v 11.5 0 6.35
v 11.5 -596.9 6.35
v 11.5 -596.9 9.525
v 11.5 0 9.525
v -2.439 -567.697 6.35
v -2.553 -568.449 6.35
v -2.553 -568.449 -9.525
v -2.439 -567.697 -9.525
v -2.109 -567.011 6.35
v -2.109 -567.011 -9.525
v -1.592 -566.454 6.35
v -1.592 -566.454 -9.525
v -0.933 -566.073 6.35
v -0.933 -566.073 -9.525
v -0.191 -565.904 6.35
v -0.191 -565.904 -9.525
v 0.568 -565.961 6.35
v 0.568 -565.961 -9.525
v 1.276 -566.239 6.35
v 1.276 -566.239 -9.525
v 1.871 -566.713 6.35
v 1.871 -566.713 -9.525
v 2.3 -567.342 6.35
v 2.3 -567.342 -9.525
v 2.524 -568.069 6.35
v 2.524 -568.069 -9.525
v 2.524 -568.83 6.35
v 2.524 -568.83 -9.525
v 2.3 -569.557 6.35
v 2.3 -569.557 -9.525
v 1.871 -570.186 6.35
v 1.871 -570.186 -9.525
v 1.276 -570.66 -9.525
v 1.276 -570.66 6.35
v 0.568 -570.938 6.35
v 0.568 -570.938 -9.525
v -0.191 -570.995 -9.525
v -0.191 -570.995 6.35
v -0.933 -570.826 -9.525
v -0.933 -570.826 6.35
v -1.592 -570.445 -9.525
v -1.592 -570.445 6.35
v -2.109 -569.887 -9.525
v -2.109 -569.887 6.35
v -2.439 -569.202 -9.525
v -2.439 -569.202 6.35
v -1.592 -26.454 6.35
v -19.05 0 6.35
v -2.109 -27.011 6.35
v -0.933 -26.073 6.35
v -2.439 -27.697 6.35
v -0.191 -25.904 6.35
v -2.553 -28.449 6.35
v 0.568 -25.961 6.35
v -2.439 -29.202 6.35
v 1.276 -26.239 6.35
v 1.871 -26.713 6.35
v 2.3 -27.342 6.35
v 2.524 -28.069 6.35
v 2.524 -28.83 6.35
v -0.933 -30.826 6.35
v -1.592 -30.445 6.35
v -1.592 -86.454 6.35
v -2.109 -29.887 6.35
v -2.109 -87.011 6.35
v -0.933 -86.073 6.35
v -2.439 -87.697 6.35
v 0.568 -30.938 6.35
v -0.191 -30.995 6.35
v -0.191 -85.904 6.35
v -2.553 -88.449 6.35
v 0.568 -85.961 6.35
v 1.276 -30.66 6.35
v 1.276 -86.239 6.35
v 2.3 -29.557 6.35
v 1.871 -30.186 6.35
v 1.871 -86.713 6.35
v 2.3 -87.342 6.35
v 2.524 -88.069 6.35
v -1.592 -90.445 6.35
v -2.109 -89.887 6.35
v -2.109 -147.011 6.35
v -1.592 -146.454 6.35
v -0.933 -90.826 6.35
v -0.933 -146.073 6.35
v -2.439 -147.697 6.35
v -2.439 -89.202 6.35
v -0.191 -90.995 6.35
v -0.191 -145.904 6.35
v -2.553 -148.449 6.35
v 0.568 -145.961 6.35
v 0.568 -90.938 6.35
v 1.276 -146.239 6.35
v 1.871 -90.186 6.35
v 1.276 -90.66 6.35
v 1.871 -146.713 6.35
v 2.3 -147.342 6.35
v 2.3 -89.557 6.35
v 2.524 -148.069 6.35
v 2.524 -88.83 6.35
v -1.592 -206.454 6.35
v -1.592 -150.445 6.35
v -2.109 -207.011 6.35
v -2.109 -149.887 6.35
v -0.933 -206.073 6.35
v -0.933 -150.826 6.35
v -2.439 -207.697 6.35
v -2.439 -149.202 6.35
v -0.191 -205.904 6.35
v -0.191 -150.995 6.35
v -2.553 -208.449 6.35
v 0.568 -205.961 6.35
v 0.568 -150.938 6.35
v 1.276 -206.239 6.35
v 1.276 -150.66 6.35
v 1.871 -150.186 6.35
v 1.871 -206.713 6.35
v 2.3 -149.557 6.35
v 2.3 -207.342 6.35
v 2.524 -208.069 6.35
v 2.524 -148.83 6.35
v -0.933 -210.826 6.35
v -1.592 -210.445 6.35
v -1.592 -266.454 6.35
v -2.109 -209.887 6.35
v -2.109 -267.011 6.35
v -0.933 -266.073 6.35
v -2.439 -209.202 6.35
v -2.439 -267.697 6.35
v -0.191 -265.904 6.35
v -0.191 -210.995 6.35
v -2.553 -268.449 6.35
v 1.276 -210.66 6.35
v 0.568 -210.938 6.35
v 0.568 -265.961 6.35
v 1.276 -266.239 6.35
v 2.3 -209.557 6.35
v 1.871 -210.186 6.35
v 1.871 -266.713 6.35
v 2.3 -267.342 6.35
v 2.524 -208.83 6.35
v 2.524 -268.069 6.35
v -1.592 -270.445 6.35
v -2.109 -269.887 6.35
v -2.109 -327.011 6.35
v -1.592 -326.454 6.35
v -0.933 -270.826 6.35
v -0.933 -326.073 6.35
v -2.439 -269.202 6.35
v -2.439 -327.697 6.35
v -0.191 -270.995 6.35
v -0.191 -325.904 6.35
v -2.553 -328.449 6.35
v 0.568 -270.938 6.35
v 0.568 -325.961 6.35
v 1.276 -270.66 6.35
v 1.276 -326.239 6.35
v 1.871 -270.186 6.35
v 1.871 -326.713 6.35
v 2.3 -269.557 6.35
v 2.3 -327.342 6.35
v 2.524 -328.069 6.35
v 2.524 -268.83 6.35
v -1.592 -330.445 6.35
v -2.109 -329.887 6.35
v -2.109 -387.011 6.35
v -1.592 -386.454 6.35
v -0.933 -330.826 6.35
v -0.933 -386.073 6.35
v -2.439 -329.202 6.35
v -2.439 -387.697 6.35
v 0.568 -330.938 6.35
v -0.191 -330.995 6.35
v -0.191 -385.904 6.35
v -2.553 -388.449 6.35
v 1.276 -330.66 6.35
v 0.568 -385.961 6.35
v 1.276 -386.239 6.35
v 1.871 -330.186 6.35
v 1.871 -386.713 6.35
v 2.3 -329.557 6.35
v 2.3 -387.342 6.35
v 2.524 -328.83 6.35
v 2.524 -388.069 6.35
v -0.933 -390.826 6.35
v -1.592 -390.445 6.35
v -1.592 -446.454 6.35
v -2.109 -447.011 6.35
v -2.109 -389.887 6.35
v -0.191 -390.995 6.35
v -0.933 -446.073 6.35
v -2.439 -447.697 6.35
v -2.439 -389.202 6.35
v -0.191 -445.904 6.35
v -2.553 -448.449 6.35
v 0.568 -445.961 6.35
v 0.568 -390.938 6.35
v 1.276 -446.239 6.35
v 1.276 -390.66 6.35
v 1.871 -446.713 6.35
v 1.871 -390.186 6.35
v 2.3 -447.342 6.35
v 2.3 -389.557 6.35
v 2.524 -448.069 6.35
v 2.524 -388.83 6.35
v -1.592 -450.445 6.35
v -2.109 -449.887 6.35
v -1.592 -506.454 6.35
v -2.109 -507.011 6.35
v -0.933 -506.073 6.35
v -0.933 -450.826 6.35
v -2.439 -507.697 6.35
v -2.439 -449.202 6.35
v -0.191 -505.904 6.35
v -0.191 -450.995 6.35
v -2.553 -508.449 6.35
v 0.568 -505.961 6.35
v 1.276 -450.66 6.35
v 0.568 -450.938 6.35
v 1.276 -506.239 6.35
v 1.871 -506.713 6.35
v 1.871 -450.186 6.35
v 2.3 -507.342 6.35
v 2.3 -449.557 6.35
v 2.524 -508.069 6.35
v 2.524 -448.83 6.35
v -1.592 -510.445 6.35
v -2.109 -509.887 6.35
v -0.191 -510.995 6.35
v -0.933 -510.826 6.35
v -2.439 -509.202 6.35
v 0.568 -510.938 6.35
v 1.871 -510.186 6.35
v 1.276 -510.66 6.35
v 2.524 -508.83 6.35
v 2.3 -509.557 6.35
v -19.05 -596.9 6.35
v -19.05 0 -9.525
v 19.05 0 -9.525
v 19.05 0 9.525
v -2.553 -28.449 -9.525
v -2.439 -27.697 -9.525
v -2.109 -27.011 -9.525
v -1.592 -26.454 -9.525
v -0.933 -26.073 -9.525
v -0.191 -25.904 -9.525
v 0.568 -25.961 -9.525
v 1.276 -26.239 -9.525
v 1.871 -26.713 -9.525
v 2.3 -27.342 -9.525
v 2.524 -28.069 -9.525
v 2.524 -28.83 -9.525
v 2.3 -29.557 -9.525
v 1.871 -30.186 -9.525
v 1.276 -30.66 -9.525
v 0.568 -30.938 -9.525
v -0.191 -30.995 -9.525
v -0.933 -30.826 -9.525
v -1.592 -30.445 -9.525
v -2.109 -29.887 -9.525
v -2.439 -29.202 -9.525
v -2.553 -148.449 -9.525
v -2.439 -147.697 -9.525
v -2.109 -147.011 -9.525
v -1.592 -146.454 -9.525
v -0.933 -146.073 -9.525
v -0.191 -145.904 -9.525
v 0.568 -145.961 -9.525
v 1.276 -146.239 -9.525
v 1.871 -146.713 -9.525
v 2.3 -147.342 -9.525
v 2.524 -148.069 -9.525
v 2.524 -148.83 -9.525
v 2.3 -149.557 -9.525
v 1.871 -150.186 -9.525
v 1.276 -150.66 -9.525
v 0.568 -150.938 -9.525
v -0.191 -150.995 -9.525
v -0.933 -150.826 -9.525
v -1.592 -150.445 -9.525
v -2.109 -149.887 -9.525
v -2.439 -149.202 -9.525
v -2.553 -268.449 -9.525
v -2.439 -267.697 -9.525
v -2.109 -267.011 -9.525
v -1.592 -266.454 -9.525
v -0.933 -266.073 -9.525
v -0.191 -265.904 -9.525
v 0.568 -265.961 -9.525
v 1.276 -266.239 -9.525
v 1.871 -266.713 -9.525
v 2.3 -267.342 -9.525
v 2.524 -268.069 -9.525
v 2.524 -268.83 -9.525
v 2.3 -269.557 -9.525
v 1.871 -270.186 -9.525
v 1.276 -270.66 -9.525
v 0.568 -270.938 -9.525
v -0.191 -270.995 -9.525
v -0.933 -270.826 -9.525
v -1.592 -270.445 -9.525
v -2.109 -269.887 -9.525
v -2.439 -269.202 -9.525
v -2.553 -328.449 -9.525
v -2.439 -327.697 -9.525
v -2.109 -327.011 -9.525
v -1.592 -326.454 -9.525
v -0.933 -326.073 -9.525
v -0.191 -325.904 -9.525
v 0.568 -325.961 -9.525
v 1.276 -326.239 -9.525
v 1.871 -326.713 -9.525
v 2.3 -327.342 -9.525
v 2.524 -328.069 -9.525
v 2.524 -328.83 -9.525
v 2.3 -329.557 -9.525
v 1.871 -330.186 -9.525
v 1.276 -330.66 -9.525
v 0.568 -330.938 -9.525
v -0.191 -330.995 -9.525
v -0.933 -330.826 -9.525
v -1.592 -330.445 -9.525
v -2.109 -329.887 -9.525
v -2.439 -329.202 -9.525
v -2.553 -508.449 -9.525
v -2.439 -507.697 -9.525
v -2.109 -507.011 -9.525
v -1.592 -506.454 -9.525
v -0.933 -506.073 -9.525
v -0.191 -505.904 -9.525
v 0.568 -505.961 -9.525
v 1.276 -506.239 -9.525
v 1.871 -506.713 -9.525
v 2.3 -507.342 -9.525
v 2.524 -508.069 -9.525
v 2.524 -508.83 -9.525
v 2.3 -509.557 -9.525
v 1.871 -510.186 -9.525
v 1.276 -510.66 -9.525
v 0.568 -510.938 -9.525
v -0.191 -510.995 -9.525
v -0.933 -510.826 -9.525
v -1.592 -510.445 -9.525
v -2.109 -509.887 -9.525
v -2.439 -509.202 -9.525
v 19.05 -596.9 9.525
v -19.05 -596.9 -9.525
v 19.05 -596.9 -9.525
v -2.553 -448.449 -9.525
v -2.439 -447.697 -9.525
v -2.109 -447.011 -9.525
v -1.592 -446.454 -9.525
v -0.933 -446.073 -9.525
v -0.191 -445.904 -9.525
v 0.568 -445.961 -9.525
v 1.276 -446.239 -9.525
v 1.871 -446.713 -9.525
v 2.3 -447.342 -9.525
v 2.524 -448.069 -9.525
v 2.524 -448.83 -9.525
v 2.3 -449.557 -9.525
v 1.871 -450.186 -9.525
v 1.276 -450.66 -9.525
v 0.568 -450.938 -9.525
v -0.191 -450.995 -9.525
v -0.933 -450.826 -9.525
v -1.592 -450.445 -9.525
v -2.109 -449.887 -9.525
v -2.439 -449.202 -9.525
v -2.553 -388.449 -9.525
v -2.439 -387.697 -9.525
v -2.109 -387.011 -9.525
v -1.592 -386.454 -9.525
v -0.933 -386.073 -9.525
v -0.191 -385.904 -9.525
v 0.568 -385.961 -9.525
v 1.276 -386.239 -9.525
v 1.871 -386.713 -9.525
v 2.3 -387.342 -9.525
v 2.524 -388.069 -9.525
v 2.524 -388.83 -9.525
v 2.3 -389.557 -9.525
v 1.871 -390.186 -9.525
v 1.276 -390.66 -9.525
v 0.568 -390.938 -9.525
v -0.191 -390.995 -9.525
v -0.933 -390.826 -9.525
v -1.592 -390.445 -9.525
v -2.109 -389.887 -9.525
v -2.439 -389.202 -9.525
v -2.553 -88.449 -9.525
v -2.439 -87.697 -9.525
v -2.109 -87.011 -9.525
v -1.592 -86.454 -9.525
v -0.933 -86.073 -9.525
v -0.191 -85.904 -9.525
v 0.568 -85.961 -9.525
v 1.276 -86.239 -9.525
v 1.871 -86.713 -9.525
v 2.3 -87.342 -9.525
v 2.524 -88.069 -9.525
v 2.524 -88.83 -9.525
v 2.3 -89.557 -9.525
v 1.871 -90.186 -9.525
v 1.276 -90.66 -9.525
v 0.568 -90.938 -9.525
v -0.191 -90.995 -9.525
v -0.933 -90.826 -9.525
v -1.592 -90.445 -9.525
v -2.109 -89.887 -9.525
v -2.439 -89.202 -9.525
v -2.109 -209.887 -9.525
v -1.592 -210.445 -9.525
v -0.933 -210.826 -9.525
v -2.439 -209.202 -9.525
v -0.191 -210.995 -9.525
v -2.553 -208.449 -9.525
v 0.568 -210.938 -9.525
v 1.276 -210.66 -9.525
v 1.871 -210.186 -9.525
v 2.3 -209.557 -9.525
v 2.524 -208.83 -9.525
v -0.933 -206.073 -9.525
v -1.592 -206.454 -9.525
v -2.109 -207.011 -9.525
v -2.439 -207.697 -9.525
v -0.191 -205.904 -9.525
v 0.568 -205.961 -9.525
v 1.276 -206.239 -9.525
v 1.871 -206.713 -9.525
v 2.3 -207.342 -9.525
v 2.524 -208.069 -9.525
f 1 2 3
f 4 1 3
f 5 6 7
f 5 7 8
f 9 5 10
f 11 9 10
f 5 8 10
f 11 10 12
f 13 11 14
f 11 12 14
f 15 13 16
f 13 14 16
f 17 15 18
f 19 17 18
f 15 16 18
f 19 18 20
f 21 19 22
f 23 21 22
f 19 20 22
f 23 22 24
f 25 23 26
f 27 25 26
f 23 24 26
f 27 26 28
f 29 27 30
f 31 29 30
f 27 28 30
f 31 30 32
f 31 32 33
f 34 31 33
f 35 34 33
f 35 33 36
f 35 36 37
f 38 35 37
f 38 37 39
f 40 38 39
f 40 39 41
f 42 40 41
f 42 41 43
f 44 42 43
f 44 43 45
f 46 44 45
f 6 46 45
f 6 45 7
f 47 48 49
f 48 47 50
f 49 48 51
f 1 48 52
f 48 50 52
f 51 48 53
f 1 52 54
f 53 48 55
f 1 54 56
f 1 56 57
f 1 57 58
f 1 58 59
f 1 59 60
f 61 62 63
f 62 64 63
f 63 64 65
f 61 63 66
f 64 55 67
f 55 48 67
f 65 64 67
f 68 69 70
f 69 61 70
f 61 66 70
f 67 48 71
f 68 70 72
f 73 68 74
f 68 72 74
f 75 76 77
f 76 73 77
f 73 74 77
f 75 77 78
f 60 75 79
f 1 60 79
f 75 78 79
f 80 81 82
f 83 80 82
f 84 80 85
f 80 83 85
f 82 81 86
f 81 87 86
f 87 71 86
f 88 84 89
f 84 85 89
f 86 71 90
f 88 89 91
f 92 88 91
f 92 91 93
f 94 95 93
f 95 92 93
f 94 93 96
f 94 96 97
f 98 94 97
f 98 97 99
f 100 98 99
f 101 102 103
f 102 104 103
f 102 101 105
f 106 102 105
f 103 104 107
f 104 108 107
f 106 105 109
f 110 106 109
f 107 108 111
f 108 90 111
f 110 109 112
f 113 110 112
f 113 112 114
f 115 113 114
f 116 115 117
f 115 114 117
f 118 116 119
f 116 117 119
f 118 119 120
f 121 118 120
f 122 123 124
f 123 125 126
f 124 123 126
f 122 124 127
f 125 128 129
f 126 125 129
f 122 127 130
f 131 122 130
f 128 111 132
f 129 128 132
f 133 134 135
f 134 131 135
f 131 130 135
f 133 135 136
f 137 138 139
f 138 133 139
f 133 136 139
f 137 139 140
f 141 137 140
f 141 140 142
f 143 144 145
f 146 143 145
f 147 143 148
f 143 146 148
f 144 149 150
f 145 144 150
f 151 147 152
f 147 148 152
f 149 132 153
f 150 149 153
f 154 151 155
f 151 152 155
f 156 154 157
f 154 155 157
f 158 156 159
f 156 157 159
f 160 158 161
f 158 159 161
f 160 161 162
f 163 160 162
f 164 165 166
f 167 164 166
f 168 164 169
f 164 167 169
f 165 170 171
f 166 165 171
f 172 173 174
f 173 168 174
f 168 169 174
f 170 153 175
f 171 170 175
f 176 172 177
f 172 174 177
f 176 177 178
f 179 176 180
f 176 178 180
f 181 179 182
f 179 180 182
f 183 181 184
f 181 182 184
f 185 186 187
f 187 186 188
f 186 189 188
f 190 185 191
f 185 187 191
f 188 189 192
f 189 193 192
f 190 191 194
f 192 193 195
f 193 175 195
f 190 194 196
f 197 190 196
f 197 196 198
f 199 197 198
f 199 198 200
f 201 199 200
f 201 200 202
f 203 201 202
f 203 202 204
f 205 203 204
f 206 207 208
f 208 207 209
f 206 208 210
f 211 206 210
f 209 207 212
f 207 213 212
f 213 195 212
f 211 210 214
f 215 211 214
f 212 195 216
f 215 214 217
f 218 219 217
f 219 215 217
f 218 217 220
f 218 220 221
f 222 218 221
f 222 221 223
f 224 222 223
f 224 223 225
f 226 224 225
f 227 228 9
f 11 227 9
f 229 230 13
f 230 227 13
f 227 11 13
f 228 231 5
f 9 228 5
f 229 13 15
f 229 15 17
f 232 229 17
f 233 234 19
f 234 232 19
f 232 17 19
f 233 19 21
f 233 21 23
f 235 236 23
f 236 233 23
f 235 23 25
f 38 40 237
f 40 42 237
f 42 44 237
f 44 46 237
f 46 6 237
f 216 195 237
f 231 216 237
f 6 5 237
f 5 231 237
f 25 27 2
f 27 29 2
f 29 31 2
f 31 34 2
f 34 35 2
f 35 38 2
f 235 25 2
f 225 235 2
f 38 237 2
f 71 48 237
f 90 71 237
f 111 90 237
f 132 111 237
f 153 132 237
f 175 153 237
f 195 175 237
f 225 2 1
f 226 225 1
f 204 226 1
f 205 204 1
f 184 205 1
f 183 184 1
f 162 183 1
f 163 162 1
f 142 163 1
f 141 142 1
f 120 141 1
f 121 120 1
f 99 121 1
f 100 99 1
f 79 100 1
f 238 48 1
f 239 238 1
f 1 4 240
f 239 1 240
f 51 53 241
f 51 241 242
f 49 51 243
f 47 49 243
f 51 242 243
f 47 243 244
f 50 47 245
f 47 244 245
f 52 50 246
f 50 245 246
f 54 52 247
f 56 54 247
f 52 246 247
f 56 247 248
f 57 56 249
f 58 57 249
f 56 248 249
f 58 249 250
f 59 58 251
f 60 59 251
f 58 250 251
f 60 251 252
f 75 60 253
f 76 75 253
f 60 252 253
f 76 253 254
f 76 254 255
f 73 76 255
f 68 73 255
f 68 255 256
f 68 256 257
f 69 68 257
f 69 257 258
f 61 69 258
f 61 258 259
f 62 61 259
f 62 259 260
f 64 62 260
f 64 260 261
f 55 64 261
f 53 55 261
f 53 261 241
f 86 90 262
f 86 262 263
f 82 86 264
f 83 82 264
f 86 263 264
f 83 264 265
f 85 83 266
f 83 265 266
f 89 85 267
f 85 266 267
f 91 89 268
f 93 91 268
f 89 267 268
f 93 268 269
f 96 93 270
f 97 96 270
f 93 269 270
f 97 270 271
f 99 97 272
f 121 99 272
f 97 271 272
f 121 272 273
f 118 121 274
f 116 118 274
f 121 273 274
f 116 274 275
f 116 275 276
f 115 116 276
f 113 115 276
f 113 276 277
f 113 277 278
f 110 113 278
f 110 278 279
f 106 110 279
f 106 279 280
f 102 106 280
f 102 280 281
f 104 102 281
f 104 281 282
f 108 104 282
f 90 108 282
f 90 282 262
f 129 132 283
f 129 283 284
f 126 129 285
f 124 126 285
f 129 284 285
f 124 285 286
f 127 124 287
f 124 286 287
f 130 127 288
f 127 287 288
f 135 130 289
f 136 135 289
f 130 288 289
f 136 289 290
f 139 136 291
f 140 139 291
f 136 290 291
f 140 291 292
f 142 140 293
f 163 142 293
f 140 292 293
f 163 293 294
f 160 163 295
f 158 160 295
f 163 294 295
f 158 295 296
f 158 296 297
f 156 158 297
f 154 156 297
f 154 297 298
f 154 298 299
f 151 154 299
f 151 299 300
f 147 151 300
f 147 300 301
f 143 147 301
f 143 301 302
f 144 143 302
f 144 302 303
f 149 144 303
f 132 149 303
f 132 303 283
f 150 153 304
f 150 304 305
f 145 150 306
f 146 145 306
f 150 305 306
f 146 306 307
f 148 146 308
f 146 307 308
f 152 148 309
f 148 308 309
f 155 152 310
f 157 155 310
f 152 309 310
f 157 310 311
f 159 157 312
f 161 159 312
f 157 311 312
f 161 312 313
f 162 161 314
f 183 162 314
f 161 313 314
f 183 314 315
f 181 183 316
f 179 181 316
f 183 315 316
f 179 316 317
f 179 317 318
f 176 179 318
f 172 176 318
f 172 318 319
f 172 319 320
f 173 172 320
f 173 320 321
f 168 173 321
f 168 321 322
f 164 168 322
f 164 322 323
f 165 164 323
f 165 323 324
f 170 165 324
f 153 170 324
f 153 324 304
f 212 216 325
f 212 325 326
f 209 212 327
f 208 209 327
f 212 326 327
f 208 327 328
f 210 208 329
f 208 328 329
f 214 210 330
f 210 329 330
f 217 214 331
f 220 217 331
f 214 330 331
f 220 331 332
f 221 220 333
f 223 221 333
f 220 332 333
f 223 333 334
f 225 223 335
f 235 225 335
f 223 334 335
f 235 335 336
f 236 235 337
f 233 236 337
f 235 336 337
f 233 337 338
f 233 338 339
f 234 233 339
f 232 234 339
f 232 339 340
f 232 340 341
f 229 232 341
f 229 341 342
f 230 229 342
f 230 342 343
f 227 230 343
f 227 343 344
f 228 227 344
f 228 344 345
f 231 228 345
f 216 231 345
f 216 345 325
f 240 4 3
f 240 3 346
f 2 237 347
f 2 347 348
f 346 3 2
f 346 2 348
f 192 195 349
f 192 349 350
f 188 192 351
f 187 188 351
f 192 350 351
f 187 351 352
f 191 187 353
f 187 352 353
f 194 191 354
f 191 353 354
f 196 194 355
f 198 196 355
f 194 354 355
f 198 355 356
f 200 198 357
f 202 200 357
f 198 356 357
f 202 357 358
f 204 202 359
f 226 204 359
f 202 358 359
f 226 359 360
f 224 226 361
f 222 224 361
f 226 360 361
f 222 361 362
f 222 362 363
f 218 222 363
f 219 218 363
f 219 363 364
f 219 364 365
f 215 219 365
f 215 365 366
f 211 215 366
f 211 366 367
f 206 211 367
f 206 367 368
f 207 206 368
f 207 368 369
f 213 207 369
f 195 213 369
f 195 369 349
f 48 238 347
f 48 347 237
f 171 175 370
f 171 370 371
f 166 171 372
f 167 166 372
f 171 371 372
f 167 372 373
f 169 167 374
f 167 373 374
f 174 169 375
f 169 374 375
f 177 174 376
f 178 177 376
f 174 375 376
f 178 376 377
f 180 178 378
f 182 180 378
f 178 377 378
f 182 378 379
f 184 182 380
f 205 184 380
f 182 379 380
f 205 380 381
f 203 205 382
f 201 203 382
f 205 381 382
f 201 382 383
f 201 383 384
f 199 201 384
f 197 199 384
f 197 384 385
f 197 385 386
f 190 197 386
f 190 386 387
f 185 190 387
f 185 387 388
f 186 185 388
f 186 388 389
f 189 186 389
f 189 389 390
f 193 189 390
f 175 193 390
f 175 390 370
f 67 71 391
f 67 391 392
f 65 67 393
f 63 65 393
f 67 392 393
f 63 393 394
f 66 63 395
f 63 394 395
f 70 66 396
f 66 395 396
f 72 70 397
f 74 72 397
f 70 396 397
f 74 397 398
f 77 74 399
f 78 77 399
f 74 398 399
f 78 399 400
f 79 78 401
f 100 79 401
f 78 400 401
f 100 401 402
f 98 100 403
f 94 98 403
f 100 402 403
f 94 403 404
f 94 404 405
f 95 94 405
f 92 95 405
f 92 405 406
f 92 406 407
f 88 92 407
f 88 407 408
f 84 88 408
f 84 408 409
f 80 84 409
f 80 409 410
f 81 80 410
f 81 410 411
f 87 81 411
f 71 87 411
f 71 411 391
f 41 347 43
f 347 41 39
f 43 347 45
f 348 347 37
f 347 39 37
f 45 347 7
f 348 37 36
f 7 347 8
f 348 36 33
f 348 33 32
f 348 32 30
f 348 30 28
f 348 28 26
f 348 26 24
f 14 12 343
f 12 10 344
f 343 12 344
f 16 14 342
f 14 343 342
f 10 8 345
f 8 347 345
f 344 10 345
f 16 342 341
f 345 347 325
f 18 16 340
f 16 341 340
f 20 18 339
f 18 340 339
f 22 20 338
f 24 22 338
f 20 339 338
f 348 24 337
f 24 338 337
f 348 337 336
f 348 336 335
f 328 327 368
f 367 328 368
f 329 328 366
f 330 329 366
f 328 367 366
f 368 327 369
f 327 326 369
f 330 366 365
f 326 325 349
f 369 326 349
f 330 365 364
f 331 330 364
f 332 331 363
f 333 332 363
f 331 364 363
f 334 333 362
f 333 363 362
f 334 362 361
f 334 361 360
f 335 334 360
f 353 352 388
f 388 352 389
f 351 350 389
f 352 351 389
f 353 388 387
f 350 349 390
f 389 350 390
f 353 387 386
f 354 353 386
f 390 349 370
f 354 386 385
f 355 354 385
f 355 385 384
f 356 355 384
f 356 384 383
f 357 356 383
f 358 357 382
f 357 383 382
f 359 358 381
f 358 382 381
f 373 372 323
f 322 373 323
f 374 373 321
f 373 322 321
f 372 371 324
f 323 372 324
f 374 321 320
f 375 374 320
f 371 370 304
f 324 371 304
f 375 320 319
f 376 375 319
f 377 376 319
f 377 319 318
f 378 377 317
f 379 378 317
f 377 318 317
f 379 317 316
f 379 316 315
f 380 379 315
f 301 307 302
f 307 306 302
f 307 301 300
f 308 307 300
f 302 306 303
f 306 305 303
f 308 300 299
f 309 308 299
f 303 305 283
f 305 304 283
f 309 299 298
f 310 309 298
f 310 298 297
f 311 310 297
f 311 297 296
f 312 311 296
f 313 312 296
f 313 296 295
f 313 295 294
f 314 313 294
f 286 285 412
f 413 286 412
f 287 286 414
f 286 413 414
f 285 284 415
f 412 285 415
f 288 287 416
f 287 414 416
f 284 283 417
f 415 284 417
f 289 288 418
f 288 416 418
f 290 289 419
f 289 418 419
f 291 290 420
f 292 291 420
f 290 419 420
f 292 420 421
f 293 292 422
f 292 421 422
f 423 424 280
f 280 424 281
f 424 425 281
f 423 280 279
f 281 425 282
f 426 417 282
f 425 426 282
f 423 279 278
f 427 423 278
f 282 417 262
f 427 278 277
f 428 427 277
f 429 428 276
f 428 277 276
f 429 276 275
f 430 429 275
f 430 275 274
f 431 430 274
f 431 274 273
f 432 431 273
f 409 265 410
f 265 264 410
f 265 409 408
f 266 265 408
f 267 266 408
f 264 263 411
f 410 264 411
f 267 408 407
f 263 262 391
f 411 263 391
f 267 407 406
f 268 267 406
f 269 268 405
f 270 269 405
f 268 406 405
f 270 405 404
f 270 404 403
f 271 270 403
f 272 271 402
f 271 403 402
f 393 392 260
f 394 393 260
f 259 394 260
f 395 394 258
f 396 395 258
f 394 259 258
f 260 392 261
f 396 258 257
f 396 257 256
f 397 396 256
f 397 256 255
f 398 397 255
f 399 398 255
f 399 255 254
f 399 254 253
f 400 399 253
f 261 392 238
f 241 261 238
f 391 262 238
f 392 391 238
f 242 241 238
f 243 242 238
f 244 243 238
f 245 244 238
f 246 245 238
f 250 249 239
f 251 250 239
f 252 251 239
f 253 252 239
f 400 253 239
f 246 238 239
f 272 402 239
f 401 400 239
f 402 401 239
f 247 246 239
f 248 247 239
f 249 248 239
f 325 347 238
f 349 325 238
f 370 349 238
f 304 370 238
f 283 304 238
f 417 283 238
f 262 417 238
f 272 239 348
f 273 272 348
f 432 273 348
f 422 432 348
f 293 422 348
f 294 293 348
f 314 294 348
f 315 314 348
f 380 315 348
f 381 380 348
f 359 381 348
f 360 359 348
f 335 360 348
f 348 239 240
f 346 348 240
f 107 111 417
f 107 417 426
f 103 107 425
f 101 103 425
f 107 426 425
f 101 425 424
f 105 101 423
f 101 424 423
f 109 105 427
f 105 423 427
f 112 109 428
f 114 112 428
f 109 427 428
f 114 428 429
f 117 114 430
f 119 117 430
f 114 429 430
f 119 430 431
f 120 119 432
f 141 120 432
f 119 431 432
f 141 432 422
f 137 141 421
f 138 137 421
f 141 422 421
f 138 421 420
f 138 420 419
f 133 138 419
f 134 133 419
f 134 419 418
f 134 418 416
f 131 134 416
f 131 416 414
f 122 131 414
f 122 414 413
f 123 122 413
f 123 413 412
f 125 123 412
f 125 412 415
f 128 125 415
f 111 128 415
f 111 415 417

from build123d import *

# Parameters (mm, degrees)
F0_W     = 38.1
F0_H     = 19.05
F1_DEPTH = 596.9
F2_W     = 30.55
F2_H     = 3.175
F3_DEPTH = 596.901
F5_D     = 5.1054
F5_DEPTH = 16.5100084667
F5_TIP   = 1.5338169022


with BuildPart() as f1:
    # F0 (on Front) → F1 (new body)
    with BuildSketch(Plane.XZ):
        Rectangle(F0_W, F0_H)
    extrude(amount=F1_DEPTH)

    # F2 (on face) → F3 (cut, through all)
    with BuildSketch(Plane.XZ.offset(596.9)):
        with Locations((-3.775, 7.9375)):
            Rectangle(F2_W, F2_H)
    extrude(amount=-F3_DEPTH, mode=Mode.SUBTRACT)

    # F5
    with Locations(Plane.XY.offset(6.35)):
        with Locations((0, -568.44946), (0, -508.44946), (0, -448.44946), (0, -388.44946), (0, -328.44946), (0, -268.44946), (0, -208.44946), (0, -148.44946), (0, -88.44946), (0, -28.44946)):
            Hole(F5_D / 2, depth=F5_DEPTH)
            with Locations((0, 0, -(F5_DEPTH + F5_TIP / 2))):  # 118° drill point
                Cone(0, F5_D / 2, F5_TIP, mode=Mode.SUBTRACT)


solid = f1.part
